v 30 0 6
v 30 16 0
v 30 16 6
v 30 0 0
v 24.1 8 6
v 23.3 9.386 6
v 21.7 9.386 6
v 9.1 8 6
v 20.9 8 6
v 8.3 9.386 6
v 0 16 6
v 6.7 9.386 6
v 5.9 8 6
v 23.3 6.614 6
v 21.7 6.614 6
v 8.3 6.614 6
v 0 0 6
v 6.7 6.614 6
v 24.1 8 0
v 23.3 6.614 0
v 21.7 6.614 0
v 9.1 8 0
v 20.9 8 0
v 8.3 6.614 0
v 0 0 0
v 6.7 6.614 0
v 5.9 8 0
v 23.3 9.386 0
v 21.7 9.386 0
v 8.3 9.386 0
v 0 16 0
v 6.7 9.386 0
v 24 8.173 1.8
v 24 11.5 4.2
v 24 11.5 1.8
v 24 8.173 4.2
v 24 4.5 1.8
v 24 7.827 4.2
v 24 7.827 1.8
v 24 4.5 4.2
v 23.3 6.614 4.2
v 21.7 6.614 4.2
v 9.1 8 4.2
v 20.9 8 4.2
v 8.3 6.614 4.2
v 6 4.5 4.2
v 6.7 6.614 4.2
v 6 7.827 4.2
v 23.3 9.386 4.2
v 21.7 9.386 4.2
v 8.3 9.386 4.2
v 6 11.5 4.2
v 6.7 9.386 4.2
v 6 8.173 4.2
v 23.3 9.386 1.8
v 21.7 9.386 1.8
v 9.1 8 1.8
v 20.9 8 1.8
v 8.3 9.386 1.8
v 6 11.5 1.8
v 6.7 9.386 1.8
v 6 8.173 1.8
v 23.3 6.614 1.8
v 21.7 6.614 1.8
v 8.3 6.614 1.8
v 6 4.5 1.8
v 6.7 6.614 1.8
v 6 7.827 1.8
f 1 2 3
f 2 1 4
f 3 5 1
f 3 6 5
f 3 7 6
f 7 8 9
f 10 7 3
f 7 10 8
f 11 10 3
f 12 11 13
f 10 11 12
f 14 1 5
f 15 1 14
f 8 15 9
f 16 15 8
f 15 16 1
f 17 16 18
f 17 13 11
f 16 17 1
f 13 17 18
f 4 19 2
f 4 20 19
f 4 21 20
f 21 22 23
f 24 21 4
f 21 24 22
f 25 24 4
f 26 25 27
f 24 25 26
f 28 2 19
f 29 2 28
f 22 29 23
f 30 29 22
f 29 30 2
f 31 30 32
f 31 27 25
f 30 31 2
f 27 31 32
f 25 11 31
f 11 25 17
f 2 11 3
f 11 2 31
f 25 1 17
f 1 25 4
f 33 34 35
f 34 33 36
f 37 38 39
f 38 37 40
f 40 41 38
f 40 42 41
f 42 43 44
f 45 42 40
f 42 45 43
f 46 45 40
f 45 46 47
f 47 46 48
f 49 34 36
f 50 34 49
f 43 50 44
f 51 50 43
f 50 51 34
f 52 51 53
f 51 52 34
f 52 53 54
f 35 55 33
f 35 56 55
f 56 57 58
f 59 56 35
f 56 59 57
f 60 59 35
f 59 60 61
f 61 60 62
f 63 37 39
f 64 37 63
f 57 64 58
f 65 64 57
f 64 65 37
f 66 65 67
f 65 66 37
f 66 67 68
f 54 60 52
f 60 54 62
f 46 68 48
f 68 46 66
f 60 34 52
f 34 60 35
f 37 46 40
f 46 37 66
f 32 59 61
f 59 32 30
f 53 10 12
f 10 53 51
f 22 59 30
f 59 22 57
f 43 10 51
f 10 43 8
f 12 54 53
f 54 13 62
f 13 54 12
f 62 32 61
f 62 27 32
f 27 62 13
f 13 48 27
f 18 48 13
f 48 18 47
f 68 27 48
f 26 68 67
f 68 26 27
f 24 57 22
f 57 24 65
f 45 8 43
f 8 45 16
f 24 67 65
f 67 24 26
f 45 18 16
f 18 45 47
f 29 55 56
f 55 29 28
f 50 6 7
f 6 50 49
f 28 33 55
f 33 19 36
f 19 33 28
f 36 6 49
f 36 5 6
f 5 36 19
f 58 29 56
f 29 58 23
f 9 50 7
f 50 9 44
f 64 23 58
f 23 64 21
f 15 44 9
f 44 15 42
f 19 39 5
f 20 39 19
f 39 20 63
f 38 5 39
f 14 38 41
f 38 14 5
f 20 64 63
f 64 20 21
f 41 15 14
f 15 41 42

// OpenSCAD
module belt_clamp() {
  difference() {
    cube([30.0, 16.0, 6.0], center=false);
    translate([6.0, 4.5, 1.8]) cube([18.0, 7.0, 2.4], center=false);
    translate([7.5, 8.0, -1]) cylinder(h=8.0, d=3.2, center=false);
    translate([22.5, 8.0, -1]) cylinder(h=8.0, d=3.2, center=false);
  }
}
belt_clamp();
